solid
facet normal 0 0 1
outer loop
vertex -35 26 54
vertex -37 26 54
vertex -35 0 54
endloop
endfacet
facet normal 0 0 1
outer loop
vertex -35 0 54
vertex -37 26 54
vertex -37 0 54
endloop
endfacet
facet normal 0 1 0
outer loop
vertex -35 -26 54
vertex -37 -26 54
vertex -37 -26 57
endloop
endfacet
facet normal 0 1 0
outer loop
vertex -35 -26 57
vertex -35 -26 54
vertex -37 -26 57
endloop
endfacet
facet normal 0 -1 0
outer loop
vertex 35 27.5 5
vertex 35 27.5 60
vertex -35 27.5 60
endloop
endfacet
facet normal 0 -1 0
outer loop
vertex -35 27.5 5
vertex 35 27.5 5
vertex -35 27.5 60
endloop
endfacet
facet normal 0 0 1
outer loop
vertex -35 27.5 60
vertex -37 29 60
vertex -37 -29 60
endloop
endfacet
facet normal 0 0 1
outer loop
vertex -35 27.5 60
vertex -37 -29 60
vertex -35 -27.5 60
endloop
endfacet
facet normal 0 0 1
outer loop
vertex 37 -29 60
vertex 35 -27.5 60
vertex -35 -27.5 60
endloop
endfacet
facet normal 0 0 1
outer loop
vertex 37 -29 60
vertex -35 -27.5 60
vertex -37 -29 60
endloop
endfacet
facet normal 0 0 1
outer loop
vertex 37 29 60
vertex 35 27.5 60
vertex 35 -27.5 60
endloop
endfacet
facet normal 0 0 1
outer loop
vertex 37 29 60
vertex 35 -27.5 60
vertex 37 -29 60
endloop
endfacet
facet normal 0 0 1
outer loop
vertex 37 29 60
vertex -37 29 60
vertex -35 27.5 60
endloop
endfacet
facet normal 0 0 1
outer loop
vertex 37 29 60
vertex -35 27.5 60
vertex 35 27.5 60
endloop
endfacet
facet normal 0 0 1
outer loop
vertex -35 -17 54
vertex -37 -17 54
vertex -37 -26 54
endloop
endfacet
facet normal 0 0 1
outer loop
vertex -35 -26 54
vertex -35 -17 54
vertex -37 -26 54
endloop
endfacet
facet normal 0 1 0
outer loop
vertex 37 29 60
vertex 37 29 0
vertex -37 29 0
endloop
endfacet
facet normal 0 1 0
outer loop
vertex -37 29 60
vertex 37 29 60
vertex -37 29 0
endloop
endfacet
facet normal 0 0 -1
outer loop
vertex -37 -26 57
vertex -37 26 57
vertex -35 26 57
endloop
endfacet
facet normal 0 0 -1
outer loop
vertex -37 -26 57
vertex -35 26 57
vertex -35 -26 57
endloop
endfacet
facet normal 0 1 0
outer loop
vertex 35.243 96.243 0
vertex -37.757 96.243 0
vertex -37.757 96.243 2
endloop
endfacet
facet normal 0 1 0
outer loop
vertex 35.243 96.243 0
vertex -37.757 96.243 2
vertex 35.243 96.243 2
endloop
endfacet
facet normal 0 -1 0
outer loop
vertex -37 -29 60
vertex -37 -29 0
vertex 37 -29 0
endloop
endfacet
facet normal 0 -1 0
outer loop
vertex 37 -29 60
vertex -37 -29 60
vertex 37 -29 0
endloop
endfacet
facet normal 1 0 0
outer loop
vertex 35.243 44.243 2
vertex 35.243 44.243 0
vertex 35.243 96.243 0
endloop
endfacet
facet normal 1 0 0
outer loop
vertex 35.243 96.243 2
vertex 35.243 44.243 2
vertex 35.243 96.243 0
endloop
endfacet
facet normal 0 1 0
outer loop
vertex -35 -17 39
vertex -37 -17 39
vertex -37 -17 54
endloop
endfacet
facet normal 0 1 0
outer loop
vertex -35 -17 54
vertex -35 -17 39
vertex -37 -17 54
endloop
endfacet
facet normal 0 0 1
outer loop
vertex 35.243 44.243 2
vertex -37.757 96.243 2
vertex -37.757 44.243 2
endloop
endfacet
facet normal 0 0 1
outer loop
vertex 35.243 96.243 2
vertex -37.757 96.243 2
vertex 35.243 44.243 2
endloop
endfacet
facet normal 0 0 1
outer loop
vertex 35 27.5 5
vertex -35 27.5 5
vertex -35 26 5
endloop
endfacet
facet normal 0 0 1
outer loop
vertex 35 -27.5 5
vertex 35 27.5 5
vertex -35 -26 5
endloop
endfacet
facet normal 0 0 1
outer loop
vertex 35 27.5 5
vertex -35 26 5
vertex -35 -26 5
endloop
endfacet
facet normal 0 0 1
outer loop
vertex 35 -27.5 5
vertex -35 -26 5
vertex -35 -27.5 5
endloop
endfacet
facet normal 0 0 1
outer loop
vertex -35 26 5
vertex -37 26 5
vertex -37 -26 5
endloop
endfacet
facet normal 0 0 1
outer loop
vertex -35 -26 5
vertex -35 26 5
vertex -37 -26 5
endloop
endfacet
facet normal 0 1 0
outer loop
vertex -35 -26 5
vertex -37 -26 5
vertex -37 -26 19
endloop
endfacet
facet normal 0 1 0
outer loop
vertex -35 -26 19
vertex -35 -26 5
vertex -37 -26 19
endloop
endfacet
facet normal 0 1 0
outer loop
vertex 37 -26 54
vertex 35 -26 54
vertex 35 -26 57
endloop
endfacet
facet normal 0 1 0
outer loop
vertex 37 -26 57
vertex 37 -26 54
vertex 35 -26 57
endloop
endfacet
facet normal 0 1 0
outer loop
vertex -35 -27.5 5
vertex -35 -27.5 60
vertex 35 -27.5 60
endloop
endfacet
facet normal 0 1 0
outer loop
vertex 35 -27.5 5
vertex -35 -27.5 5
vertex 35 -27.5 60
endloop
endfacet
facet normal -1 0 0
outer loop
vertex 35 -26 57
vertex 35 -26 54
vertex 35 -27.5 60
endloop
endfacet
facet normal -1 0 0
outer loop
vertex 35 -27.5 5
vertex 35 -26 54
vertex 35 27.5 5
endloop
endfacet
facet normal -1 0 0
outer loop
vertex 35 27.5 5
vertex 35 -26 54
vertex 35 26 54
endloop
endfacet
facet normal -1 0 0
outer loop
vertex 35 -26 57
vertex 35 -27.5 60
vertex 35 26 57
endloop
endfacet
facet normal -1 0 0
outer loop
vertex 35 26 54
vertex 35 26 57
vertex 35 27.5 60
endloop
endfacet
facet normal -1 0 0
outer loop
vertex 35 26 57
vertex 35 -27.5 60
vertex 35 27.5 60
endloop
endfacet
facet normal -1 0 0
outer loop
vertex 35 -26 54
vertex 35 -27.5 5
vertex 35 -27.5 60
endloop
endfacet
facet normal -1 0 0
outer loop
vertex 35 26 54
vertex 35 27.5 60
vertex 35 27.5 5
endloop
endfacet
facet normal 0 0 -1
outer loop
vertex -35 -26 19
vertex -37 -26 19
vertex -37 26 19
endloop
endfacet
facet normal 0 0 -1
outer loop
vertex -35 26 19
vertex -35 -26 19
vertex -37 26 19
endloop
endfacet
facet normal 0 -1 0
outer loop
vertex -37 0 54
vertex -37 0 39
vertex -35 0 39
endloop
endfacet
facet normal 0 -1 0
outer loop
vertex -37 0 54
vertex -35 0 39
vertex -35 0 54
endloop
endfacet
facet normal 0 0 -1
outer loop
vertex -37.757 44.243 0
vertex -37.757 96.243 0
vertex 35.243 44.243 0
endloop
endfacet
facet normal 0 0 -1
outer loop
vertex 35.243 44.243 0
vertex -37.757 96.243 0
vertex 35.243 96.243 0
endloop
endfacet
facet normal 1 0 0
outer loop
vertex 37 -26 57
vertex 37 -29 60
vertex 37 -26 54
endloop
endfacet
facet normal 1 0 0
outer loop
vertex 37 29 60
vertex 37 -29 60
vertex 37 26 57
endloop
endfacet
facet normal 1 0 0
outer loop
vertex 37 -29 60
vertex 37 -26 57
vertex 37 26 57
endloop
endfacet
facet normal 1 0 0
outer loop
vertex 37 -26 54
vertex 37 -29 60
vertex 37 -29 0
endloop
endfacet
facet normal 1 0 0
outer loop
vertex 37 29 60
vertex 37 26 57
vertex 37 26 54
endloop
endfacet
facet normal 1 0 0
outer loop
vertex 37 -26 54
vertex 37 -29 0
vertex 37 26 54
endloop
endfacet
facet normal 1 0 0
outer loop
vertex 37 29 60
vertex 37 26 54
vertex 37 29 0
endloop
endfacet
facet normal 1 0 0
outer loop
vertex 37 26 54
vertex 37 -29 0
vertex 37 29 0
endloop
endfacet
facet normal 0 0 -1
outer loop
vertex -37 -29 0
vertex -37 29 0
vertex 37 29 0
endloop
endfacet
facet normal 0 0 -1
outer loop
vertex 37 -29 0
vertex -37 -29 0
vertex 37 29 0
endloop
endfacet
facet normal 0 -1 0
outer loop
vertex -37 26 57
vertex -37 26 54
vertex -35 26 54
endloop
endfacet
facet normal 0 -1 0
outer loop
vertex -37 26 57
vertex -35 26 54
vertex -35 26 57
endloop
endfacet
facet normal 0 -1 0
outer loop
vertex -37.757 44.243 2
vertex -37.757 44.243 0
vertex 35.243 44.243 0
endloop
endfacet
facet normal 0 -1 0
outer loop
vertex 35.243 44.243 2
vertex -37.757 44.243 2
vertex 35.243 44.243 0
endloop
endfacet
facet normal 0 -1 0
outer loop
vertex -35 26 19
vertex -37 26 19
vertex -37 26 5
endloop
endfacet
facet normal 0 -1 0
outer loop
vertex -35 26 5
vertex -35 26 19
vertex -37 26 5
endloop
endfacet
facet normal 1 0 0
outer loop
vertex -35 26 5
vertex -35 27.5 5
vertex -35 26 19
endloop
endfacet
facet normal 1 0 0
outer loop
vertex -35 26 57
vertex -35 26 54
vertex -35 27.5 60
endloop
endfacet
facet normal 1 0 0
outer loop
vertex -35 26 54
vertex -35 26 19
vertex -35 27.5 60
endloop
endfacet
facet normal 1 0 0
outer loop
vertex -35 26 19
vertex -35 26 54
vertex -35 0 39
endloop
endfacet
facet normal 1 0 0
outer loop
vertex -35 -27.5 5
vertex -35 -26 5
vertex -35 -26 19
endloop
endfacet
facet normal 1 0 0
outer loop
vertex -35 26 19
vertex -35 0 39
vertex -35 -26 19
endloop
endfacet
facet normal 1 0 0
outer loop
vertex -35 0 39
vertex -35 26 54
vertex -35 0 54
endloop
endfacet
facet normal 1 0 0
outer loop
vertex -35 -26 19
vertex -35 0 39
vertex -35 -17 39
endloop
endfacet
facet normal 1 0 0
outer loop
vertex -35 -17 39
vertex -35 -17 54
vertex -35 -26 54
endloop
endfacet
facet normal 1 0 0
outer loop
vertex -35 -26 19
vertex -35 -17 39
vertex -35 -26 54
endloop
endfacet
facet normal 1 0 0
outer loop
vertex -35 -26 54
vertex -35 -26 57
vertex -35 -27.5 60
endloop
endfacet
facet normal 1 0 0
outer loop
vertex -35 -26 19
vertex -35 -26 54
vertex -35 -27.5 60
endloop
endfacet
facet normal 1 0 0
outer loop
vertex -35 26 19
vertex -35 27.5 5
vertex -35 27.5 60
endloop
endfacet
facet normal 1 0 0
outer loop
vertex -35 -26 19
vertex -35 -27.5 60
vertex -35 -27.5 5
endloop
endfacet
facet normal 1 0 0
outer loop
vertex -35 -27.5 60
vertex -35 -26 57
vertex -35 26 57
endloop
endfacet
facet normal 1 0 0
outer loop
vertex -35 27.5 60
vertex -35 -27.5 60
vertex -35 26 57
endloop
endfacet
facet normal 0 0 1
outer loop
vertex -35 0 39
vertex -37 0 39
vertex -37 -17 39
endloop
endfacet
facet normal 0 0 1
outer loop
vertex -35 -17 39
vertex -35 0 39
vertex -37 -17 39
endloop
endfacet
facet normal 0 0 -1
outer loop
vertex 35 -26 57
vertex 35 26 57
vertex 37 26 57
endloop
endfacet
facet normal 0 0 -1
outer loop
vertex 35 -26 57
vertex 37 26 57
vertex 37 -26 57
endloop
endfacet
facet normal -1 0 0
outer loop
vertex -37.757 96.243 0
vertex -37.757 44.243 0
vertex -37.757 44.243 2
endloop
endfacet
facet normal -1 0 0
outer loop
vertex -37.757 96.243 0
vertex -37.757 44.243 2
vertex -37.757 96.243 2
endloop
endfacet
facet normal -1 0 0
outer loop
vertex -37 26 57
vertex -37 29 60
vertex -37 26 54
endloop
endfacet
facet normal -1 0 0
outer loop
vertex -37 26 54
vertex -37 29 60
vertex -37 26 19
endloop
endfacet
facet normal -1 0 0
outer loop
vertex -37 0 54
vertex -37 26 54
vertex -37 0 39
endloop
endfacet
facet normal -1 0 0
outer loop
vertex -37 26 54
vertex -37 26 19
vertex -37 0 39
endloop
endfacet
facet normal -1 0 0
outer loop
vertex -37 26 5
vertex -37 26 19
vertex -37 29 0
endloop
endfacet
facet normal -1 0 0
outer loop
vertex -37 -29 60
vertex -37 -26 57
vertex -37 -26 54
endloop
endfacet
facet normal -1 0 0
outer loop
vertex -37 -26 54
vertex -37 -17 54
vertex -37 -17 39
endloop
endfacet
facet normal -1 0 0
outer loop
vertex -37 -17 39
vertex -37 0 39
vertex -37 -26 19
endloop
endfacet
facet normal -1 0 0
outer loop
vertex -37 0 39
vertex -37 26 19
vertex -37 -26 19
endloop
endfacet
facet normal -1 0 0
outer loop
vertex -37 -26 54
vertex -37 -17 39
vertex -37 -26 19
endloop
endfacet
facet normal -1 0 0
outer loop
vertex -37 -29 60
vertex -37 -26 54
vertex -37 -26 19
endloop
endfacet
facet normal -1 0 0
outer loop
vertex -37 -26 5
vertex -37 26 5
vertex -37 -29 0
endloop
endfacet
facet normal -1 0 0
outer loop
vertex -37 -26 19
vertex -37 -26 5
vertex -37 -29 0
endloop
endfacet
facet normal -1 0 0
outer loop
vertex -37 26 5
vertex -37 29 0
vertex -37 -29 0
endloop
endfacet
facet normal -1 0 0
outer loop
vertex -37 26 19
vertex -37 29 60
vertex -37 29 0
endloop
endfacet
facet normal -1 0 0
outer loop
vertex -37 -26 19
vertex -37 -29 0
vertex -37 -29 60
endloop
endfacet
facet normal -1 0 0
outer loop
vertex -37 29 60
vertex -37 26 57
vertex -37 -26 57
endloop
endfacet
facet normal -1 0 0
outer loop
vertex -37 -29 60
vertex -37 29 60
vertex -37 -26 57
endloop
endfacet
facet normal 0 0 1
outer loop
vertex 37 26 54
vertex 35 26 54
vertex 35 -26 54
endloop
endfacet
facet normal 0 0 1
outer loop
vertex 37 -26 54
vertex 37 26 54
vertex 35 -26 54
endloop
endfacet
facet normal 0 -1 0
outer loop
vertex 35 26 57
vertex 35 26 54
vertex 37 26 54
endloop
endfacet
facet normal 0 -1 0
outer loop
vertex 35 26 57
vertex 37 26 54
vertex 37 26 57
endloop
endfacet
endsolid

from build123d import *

# Parameters (mm, degrees)
F0_W      = 37
F0_H      = 29
F1_DEPTH  = 60
F2_W      = 35
F2_H      = 27.5
F3_DEPTH  = 55
F5_DEPTH  = 3
F6_W      = 17
F6_H      = 15
F7_DEPTH  = 3
F8_W      = 52
F8_H      = 3
F9_DEPTH  = 76.7
F10_W     = 73
F10_H     = 52
F11_DEPTH = 2


with BuildPart() as f1:
    # F0 (on Top) → F1 (new body)
    with BuildSketch(Plane.XY):
        with Locations((-18.5, 14.5)):
            Rectangle(F0_W, F0_H)
        with Locations((18.5, 14.5)):
            Rectangle(F0_W, F0_H)
        with Locations((-18.5, -14.5)):
            Rectangle(F0_W, F0_H)
        with Locations((18.5, -14.5)):
            Rectangle(F0_W, F0_H)
    extrude(amount=F1_DEPTH)

    # F2 (on face) → F3 (cut)
    with BuildSketch(Plane.XY.offset(60)):
        with Locations((-17.5, 13.75)):
            Rectangle(F2_W, F2_H)
        with Locations((17.5, 13.75)):
            Rectangle(F2_W, F2_H)
        with Locations((-17.5, -13.75)):
            Rectangle(F2_W, F2_H)
        with Locations((17.5, -13.75)):
            Rectangle(F2_W, F2_H)
    extrude(amount=-F3_DEPTH, mode=Mode.SUBTRACT)

    # F4 (on face) → F5 (cut)
    with BuildSketch(Plane(origin=(-37, 0, 0), x_dir=(0, -1, 0), z_dir=(-1, 0, 0))):
        Polygon((-26, 12), (-26, 5), (26, 5), (26, 12), (0, 12), align=None)
        Polygon((-26, 19), (-26, 12), (0, 12), (26, 12), (26, 19), align=None)
    extrude(amount=-F5_DEPTH, mode=Mode.SUBTRACT)

    # F6 (on face) → F7 (cut)
    with BuildSketch(Plane(origin=(-37, 0, 0), x_dir=(0, -1, 0), z_dir=(-1, 0, 0))):
        with Locations((8.5, 46.5)):
            Rectangle(F6_W, F6_H)
    extrude(amount=-F7_DEPTH, mode=Mode.SUBTRACT)

    # F8 (on face) → F9 (cut)
    with BuildSketch(Plane(origin=(-37, 0, 0), x_dir=(0, -1, 0), z_dir=(-1, 0, 0))):
        with Locations((0, 55.5)):
            Rectangle(F8_W, F8_H)
    extrude(amount=-F9_DEPTH, mode=Mode.SUBTRACT)


with BuildPart() as f11:
    # F10 (on Top) → F11 (new body)
    with BuildSketch(Plane.XY):
        with Locations((-1.25665, 70.242931)):
            Rectangle(F10_W, F10_H)
    extrude(amount=F11_DEPTH)


solid = Compound([f1.part, f11.part])
